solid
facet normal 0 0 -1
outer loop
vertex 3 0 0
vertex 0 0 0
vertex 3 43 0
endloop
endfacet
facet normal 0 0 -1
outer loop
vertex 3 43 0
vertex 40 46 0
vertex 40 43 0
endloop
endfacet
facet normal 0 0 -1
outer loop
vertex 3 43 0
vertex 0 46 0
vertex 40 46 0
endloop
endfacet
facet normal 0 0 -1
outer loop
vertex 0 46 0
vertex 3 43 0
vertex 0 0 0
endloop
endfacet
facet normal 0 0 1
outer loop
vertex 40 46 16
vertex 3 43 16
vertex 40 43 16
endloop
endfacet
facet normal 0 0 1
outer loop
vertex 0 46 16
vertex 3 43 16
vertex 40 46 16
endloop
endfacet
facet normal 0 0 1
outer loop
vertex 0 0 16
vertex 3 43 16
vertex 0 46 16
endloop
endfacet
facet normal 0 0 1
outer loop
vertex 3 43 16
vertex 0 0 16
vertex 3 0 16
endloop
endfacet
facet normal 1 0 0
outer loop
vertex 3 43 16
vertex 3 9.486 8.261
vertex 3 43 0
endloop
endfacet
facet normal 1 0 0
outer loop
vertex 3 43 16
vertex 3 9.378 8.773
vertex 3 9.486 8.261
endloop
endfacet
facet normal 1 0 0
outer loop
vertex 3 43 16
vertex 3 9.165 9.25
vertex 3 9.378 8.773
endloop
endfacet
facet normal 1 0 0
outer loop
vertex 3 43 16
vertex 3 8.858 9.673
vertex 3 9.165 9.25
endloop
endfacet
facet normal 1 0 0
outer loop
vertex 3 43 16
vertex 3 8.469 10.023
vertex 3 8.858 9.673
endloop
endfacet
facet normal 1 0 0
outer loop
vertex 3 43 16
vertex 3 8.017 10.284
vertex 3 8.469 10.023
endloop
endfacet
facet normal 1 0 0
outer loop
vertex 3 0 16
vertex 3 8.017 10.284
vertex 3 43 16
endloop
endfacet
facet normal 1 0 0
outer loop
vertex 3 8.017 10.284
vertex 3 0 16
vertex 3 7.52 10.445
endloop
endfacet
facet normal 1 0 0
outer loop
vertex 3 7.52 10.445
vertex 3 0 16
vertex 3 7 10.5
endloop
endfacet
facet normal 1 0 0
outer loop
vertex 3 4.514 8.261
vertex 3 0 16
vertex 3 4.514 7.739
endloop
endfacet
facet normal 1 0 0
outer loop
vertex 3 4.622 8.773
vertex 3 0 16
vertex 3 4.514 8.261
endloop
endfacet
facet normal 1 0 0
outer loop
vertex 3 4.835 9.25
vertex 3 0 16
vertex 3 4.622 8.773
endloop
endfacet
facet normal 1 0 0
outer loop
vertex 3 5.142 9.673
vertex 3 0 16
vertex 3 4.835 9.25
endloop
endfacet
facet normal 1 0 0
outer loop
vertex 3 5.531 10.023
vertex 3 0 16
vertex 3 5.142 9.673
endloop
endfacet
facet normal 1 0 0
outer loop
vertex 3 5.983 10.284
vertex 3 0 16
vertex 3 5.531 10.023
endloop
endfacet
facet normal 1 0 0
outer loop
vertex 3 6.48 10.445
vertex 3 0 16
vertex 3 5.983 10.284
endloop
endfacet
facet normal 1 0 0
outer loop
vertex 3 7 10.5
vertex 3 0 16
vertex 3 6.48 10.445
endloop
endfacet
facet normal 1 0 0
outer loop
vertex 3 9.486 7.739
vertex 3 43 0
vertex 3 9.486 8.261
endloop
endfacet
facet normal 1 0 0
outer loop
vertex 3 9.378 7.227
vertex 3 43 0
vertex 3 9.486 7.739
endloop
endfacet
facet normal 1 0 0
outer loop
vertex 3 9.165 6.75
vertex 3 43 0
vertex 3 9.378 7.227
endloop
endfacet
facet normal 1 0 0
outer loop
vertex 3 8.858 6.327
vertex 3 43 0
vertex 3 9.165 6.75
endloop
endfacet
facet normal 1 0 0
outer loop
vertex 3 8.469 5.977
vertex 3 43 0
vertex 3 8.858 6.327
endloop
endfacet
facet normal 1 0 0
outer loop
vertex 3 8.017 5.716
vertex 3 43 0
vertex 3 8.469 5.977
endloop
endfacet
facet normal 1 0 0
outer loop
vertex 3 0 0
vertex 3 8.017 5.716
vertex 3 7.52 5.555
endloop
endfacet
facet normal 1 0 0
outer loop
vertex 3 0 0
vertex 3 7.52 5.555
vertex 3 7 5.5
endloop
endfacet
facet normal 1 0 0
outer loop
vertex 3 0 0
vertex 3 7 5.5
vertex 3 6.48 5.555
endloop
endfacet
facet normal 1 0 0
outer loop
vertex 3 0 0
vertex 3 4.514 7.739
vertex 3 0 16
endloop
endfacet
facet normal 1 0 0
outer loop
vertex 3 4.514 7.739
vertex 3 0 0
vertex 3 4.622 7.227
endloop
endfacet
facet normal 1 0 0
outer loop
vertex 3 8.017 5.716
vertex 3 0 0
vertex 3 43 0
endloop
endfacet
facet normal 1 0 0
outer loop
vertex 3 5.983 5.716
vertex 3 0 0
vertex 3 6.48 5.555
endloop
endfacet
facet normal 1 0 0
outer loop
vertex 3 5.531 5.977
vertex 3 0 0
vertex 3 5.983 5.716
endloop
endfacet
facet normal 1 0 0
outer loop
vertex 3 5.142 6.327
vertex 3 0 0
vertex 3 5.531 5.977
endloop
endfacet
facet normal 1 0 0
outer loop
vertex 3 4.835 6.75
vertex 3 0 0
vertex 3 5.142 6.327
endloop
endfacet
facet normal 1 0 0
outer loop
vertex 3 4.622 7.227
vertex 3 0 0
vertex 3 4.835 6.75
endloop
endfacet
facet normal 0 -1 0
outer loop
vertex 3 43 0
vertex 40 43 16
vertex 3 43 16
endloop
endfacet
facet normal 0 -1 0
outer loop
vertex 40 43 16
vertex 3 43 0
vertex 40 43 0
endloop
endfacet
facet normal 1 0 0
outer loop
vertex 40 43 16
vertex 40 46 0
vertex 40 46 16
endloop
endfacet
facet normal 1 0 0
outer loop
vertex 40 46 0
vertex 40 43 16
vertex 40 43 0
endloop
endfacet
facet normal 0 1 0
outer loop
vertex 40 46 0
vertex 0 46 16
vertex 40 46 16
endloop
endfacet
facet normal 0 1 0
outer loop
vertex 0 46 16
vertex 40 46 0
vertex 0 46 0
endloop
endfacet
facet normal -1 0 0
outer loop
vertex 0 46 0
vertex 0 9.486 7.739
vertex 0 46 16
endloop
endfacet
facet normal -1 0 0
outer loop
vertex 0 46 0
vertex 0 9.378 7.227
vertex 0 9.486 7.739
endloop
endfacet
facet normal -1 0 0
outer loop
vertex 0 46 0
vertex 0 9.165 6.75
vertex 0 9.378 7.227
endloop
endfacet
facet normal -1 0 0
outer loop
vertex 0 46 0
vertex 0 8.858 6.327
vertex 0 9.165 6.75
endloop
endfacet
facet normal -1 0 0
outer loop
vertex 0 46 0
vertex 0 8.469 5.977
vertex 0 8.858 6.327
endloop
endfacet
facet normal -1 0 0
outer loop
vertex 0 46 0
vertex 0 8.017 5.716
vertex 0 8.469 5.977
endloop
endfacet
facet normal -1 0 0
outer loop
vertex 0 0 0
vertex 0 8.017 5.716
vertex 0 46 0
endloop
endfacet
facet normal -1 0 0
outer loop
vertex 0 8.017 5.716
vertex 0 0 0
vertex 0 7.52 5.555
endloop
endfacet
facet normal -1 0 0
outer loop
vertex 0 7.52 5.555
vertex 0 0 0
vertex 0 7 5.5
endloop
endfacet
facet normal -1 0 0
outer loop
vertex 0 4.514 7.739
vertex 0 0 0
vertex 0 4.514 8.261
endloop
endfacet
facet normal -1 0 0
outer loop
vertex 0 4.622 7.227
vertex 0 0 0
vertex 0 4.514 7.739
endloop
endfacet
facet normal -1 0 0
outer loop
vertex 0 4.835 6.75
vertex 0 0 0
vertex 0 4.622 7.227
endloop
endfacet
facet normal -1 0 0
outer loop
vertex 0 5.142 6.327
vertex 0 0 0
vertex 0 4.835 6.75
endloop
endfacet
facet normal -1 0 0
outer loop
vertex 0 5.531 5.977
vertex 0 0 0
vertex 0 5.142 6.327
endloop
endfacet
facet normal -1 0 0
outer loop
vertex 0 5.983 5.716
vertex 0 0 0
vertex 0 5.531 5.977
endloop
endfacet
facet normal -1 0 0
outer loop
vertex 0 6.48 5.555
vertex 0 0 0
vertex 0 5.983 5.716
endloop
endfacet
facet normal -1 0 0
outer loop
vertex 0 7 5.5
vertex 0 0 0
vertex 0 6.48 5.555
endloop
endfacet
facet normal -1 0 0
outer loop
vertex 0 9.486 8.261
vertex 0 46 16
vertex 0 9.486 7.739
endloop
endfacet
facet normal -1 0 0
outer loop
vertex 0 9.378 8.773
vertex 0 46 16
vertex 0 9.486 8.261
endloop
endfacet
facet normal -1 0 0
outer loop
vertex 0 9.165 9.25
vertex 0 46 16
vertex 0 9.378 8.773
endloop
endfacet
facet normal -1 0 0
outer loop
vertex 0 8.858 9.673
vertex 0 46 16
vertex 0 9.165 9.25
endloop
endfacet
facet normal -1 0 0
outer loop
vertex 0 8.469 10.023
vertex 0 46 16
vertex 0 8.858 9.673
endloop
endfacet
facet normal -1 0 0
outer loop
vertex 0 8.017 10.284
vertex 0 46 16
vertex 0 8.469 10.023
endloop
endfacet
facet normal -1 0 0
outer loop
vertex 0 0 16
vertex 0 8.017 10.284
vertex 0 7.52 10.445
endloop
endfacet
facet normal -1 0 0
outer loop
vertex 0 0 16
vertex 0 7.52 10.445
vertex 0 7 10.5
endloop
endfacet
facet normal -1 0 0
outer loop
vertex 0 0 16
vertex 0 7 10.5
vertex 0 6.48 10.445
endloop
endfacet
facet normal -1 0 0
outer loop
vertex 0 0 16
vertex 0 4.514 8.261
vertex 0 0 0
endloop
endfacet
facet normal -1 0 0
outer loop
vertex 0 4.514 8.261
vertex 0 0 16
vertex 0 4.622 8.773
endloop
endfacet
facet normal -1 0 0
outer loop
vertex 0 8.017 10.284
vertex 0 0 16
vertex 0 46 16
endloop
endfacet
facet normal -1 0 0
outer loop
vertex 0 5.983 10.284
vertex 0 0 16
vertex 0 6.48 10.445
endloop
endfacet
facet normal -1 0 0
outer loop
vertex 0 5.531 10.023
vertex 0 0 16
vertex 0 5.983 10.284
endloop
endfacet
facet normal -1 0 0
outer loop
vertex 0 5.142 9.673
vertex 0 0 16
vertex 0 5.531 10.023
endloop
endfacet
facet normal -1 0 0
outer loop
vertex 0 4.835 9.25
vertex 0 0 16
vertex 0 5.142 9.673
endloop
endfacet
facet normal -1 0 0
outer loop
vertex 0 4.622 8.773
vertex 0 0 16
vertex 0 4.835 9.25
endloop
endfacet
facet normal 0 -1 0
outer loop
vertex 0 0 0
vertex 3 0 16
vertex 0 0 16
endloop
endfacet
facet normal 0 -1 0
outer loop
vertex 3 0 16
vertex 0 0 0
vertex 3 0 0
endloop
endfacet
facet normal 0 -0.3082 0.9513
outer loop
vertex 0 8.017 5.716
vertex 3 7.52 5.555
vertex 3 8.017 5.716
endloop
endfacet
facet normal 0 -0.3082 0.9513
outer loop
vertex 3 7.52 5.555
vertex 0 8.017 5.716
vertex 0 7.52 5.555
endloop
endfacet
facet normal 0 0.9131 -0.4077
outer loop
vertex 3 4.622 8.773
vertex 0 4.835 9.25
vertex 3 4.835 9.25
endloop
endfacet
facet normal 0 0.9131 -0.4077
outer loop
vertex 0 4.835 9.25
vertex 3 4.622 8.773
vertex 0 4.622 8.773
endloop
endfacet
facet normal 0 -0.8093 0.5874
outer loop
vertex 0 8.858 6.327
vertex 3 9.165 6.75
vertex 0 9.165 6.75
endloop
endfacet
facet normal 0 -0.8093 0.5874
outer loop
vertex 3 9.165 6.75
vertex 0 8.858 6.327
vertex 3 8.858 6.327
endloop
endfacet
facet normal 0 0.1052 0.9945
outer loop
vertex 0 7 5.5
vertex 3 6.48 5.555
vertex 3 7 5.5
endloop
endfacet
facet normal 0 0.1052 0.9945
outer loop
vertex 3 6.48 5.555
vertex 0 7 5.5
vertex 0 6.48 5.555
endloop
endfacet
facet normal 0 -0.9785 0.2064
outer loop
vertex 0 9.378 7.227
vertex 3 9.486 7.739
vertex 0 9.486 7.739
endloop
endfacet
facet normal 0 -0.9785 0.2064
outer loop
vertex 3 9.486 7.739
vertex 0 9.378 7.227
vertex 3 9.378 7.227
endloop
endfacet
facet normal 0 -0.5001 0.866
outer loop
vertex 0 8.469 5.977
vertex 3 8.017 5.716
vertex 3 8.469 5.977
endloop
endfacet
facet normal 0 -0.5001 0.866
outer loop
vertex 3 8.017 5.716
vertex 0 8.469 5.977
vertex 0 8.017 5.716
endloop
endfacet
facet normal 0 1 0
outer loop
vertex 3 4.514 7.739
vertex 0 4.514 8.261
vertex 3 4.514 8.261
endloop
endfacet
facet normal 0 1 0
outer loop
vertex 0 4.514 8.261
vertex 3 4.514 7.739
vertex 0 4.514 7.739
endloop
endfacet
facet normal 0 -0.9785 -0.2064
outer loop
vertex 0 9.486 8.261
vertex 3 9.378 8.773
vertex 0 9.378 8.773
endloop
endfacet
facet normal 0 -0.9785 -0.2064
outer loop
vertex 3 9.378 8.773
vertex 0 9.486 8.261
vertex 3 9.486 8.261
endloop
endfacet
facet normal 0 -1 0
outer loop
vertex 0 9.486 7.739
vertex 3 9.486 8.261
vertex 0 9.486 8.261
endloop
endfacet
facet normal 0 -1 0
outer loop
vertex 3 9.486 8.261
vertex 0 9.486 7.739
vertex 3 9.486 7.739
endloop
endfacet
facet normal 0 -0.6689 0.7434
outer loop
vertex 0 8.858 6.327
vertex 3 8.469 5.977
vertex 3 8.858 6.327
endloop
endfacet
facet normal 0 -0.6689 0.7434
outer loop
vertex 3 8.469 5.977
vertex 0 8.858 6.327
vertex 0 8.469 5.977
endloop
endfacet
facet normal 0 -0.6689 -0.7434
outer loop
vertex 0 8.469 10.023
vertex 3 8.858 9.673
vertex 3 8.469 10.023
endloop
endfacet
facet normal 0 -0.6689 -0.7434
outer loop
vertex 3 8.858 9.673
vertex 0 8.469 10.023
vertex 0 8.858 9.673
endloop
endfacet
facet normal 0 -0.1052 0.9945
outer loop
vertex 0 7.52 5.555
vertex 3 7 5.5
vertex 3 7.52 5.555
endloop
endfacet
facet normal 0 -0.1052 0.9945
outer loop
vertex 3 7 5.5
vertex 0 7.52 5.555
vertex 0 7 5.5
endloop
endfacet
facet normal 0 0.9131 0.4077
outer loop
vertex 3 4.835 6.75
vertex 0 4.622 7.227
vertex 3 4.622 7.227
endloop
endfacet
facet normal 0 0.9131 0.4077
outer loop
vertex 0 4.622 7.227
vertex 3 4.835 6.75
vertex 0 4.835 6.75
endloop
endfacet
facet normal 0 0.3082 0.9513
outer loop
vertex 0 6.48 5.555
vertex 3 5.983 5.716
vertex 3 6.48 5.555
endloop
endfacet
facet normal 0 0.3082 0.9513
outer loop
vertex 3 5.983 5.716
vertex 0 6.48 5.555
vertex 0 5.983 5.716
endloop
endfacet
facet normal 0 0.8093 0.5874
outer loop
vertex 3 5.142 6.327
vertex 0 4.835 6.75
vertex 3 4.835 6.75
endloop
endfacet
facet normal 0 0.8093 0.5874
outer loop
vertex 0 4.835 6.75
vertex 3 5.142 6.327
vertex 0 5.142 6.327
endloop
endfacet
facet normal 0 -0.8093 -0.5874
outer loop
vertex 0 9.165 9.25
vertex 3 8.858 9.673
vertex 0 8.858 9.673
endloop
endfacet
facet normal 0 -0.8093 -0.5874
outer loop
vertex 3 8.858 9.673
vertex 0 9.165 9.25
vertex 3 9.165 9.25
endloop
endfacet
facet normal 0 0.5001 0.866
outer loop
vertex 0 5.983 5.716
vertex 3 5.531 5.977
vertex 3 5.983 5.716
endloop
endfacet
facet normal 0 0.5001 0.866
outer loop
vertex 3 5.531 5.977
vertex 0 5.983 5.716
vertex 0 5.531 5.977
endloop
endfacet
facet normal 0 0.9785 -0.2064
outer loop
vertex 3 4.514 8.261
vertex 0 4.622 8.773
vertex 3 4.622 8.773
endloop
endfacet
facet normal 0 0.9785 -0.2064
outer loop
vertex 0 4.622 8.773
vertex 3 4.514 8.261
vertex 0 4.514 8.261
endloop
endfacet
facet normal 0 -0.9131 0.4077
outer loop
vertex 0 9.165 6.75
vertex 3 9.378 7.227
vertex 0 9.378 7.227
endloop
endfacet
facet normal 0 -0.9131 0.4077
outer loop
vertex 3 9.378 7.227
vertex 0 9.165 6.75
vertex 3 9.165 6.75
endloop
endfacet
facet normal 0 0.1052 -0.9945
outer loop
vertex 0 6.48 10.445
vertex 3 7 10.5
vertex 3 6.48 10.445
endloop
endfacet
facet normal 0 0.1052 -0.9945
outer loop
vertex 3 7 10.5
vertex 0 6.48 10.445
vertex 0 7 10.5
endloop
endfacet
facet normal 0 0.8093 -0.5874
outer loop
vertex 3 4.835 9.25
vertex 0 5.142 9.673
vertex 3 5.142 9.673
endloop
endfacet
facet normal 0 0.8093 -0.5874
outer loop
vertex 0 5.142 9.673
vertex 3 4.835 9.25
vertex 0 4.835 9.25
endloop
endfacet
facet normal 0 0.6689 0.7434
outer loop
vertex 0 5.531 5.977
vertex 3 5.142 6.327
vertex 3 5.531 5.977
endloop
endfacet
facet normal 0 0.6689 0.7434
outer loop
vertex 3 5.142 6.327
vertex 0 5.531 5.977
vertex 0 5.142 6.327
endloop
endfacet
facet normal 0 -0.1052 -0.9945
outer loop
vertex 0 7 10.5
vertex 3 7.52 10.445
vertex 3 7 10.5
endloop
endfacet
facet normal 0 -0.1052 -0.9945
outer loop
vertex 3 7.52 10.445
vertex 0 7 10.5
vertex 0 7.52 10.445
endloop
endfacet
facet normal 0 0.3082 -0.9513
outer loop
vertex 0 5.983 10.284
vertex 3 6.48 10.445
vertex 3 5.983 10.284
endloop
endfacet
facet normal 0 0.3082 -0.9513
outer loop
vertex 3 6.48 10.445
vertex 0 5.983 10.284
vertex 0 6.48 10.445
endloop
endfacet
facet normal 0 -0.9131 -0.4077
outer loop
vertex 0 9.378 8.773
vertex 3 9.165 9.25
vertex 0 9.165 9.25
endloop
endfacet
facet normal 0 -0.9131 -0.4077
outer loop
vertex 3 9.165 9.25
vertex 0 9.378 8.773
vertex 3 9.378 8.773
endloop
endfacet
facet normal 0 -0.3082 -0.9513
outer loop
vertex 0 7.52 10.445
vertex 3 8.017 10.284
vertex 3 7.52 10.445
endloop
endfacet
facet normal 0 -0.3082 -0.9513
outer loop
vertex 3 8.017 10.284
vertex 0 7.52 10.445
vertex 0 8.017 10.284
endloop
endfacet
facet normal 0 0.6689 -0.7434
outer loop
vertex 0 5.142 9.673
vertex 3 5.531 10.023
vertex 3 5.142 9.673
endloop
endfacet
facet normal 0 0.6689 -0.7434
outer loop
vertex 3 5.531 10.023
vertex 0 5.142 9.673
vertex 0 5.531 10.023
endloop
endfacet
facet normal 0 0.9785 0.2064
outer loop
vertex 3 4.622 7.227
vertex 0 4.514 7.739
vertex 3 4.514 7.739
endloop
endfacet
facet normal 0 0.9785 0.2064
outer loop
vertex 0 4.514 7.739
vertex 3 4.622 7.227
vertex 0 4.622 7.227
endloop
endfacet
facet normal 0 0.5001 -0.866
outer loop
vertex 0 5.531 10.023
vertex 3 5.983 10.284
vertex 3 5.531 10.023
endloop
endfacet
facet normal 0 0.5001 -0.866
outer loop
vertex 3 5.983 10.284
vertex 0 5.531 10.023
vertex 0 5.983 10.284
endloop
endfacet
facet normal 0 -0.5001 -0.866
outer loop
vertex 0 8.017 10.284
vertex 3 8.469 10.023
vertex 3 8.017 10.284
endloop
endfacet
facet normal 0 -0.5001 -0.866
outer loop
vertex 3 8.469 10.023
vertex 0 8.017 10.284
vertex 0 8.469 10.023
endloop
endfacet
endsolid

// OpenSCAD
// Bike_bottle_holder_bracket.scad

$fn=30;

difference()
{
    linear_extrude(height=16)
        union()
        {
            square([3, 43]);
            translate([0, 43]) square([40, 3]);
        }
    
    translate([-0.01, 7, 8])
        rotate([0, 90, 0]) cylinder(d=5, h=10);
}
